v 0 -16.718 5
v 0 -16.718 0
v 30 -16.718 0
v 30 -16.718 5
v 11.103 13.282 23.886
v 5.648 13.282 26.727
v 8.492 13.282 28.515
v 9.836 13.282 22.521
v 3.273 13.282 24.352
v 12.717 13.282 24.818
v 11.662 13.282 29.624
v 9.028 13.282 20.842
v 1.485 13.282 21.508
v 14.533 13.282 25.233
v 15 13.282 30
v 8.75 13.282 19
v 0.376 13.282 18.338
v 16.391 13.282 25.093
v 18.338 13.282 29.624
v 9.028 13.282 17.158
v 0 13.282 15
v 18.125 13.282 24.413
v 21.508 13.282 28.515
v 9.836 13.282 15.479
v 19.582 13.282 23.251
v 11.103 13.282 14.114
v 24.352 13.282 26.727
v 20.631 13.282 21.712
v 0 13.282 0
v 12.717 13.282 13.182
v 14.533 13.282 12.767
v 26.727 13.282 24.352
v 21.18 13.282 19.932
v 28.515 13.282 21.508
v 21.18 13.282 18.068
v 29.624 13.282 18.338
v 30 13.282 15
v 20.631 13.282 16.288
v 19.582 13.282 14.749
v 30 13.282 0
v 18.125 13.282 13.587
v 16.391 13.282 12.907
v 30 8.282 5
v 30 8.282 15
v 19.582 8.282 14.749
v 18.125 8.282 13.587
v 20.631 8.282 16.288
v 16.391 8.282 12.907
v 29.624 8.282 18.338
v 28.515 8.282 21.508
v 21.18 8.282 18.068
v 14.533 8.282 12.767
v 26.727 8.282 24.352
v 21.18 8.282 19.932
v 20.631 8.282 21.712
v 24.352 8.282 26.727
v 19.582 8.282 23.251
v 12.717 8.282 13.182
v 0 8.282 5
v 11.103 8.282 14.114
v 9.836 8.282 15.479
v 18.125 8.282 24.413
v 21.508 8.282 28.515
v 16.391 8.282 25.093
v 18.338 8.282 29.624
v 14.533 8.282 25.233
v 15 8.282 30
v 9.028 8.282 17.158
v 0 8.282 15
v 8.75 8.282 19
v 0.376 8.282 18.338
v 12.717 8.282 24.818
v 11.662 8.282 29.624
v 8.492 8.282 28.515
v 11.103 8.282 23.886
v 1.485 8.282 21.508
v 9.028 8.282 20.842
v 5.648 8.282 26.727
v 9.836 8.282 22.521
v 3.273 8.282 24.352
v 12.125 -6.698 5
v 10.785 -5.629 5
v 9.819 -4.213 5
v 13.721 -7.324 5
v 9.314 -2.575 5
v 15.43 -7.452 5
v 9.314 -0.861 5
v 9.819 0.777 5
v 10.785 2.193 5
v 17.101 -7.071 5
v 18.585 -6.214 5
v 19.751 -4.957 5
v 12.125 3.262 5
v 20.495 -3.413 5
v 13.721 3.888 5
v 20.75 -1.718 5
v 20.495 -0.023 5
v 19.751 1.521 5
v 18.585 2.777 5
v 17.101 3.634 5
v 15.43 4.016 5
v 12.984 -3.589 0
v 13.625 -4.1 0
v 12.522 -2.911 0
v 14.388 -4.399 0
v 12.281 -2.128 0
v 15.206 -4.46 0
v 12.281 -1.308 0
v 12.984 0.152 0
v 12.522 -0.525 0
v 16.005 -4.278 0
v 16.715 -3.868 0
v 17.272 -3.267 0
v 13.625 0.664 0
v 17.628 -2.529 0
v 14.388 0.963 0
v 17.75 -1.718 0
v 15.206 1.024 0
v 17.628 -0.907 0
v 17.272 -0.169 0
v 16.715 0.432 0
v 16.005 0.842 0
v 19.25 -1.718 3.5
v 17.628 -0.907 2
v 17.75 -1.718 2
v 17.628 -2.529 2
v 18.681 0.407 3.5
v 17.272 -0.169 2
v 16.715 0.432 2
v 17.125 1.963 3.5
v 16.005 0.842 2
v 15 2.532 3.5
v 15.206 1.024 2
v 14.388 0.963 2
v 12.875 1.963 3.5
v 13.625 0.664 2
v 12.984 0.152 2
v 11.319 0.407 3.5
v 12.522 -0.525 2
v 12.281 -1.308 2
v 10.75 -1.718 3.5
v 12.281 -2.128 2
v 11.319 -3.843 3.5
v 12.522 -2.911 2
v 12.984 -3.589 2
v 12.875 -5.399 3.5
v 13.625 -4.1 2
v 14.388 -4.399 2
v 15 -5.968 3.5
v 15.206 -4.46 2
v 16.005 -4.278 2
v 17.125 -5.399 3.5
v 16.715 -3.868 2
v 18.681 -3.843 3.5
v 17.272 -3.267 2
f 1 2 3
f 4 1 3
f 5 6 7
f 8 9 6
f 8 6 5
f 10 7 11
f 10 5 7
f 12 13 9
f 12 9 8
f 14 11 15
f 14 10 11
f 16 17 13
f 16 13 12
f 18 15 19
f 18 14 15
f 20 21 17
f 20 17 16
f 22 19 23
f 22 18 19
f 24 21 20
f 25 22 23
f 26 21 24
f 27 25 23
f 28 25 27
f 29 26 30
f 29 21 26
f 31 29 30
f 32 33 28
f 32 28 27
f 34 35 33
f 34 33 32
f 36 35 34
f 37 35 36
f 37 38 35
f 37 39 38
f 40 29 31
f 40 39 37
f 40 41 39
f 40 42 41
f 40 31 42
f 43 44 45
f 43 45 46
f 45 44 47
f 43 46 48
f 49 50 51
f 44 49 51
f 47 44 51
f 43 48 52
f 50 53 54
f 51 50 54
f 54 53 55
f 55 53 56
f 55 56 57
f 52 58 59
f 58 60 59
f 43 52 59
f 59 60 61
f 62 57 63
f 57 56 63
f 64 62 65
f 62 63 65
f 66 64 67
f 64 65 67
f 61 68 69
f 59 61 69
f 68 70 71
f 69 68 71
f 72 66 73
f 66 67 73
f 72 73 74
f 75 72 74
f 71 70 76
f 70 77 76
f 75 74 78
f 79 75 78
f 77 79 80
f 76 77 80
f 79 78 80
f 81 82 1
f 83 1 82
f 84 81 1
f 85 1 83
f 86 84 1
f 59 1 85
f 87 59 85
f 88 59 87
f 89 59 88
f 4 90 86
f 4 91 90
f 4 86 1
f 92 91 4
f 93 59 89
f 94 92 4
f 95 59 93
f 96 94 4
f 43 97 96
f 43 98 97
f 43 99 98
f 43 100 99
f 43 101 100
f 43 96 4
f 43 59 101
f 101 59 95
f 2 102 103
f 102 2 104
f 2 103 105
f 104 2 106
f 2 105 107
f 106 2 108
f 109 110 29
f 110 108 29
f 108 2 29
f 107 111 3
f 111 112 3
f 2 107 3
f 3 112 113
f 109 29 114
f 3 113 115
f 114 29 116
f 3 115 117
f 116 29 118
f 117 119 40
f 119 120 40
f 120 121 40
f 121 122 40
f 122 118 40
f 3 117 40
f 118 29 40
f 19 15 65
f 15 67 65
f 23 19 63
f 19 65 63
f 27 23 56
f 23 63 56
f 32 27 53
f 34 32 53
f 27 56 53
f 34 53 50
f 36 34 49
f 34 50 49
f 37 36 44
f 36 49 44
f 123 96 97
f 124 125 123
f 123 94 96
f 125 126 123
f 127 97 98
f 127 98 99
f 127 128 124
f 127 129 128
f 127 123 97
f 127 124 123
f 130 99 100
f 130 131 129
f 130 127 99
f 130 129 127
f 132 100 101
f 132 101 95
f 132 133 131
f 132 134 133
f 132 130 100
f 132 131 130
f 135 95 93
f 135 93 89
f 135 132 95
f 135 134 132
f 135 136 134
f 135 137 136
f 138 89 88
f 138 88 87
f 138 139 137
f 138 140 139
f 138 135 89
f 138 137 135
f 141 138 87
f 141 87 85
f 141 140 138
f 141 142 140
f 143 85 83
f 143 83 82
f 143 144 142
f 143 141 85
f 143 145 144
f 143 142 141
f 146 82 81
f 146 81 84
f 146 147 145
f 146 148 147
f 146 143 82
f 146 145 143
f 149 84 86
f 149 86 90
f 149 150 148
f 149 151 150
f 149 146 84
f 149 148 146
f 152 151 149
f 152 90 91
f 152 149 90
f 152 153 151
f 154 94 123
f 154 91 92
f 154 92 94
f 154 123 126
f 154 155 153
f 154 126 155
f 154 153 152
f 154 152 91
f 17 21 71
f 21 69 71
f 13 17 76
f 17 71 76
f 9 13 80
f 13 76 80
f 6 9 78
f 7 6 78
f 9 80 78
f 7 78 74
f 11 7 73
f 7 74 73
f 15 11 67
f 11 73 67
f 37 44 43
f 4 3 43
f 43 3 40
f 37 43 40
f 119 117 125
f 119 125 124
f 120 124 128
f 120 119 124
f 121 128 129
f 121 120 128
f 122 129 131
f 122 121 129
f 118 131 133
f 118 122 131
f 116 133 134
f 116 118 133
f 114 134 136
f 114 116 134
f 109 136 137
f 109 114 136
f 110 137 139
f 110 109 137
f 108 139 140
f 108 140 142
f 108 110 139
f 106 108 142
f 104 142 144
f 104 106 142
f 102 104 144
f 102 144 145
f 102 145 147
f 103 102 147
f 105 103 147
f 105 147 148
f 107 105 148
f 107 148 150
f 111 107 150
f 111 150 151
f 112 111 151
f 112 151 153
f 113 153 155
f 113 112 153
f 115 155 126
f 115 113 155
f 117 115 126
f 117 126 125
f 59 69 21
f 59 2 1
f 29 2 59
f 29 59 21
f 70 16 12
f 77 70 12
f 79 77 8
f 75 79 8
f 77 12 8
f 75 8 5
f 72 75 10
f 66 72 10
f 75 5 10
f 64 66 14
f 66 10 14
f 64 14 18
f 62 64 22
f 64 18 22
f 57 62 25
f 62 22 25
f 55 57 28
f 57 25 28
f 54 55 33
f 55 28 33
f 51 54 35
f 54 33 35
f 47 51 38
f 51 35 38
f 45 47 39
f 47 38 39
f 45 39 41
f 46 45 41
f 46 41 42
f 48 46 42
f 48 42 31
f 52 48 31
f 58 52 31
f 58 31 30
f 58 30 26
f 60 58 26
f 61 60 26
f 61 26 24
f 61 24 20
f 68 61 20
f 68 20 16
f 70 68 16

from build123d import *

# Parameters (mm, degrees)
F0_W     = 30
F0_H     = 30
F0_R     = 2.75
F1_DEPTH = 5
F2_W     = 30
F2_H     = 30
F3_DEPTH = 5
F4_R     = 6.25
F5_DEPTH = 6
F6_R     = 14.99999
F7_SIZE  = 3


# Not quite as in the source:
# - a fillet or chamfer is up to 0.001 mm smaller than in the source, because OpenCascade refuses the exact size


with BuildPart() as f1:
    # F0 (on Top) → F1 (new body)
    with BuildSketch(Plane.XY):
        with Locations((15, -1.7180653661)):
            Rectangle(F0_W, F0_H)
        with Locations((15, -1.7180653661)):
            Circle(F0_R, mode=Mode.SUBTRACT)
    extrude(amount=F1_DEPTH)

    # F2 (on face) → F3 (join)
    with BuildSketch(Plane(origin=(0, 13.2819346339, 0), x_dir=(-1, 0, 0), z_dir=(0, 1, 0))):
        with Locations((-15, 15)):
            Rectangle(F2_W, F2_H)
    extrude(amount=-F3_DEPTH)

    # F4 (on face) → F5 (cut)
    with BuildSketch(Plane(origin=(0, 13.2819346339, 0), x_dir=(-1, 0, 0), z_dir=(0, 1, 0))):
        with Locations((-15, 19)):
            Circle(F4_R)
    extrude(amount=-F5_DEPTH, mode=Mode.SUBTRACT)

    # F6 (radius 15 in the source; OpenCascade refuses exactly that, so slightly less here)
    f6_edges = [f1.edges().sort_by_distance(p)[0] for p in [
        (30, 10.781935, 30),
        (0, 10.781935, 30),
    ]]
    fillet(f6_edges, radius=F6_R)

    # F7
    f7_edges = [f1.edges().sort_by_distance(p)[0] for p in [
        (12.25, -1.718065, 5),
    ]]
    chamfer(f7_edges, length=F7_SIZE)


solid = f1.part
